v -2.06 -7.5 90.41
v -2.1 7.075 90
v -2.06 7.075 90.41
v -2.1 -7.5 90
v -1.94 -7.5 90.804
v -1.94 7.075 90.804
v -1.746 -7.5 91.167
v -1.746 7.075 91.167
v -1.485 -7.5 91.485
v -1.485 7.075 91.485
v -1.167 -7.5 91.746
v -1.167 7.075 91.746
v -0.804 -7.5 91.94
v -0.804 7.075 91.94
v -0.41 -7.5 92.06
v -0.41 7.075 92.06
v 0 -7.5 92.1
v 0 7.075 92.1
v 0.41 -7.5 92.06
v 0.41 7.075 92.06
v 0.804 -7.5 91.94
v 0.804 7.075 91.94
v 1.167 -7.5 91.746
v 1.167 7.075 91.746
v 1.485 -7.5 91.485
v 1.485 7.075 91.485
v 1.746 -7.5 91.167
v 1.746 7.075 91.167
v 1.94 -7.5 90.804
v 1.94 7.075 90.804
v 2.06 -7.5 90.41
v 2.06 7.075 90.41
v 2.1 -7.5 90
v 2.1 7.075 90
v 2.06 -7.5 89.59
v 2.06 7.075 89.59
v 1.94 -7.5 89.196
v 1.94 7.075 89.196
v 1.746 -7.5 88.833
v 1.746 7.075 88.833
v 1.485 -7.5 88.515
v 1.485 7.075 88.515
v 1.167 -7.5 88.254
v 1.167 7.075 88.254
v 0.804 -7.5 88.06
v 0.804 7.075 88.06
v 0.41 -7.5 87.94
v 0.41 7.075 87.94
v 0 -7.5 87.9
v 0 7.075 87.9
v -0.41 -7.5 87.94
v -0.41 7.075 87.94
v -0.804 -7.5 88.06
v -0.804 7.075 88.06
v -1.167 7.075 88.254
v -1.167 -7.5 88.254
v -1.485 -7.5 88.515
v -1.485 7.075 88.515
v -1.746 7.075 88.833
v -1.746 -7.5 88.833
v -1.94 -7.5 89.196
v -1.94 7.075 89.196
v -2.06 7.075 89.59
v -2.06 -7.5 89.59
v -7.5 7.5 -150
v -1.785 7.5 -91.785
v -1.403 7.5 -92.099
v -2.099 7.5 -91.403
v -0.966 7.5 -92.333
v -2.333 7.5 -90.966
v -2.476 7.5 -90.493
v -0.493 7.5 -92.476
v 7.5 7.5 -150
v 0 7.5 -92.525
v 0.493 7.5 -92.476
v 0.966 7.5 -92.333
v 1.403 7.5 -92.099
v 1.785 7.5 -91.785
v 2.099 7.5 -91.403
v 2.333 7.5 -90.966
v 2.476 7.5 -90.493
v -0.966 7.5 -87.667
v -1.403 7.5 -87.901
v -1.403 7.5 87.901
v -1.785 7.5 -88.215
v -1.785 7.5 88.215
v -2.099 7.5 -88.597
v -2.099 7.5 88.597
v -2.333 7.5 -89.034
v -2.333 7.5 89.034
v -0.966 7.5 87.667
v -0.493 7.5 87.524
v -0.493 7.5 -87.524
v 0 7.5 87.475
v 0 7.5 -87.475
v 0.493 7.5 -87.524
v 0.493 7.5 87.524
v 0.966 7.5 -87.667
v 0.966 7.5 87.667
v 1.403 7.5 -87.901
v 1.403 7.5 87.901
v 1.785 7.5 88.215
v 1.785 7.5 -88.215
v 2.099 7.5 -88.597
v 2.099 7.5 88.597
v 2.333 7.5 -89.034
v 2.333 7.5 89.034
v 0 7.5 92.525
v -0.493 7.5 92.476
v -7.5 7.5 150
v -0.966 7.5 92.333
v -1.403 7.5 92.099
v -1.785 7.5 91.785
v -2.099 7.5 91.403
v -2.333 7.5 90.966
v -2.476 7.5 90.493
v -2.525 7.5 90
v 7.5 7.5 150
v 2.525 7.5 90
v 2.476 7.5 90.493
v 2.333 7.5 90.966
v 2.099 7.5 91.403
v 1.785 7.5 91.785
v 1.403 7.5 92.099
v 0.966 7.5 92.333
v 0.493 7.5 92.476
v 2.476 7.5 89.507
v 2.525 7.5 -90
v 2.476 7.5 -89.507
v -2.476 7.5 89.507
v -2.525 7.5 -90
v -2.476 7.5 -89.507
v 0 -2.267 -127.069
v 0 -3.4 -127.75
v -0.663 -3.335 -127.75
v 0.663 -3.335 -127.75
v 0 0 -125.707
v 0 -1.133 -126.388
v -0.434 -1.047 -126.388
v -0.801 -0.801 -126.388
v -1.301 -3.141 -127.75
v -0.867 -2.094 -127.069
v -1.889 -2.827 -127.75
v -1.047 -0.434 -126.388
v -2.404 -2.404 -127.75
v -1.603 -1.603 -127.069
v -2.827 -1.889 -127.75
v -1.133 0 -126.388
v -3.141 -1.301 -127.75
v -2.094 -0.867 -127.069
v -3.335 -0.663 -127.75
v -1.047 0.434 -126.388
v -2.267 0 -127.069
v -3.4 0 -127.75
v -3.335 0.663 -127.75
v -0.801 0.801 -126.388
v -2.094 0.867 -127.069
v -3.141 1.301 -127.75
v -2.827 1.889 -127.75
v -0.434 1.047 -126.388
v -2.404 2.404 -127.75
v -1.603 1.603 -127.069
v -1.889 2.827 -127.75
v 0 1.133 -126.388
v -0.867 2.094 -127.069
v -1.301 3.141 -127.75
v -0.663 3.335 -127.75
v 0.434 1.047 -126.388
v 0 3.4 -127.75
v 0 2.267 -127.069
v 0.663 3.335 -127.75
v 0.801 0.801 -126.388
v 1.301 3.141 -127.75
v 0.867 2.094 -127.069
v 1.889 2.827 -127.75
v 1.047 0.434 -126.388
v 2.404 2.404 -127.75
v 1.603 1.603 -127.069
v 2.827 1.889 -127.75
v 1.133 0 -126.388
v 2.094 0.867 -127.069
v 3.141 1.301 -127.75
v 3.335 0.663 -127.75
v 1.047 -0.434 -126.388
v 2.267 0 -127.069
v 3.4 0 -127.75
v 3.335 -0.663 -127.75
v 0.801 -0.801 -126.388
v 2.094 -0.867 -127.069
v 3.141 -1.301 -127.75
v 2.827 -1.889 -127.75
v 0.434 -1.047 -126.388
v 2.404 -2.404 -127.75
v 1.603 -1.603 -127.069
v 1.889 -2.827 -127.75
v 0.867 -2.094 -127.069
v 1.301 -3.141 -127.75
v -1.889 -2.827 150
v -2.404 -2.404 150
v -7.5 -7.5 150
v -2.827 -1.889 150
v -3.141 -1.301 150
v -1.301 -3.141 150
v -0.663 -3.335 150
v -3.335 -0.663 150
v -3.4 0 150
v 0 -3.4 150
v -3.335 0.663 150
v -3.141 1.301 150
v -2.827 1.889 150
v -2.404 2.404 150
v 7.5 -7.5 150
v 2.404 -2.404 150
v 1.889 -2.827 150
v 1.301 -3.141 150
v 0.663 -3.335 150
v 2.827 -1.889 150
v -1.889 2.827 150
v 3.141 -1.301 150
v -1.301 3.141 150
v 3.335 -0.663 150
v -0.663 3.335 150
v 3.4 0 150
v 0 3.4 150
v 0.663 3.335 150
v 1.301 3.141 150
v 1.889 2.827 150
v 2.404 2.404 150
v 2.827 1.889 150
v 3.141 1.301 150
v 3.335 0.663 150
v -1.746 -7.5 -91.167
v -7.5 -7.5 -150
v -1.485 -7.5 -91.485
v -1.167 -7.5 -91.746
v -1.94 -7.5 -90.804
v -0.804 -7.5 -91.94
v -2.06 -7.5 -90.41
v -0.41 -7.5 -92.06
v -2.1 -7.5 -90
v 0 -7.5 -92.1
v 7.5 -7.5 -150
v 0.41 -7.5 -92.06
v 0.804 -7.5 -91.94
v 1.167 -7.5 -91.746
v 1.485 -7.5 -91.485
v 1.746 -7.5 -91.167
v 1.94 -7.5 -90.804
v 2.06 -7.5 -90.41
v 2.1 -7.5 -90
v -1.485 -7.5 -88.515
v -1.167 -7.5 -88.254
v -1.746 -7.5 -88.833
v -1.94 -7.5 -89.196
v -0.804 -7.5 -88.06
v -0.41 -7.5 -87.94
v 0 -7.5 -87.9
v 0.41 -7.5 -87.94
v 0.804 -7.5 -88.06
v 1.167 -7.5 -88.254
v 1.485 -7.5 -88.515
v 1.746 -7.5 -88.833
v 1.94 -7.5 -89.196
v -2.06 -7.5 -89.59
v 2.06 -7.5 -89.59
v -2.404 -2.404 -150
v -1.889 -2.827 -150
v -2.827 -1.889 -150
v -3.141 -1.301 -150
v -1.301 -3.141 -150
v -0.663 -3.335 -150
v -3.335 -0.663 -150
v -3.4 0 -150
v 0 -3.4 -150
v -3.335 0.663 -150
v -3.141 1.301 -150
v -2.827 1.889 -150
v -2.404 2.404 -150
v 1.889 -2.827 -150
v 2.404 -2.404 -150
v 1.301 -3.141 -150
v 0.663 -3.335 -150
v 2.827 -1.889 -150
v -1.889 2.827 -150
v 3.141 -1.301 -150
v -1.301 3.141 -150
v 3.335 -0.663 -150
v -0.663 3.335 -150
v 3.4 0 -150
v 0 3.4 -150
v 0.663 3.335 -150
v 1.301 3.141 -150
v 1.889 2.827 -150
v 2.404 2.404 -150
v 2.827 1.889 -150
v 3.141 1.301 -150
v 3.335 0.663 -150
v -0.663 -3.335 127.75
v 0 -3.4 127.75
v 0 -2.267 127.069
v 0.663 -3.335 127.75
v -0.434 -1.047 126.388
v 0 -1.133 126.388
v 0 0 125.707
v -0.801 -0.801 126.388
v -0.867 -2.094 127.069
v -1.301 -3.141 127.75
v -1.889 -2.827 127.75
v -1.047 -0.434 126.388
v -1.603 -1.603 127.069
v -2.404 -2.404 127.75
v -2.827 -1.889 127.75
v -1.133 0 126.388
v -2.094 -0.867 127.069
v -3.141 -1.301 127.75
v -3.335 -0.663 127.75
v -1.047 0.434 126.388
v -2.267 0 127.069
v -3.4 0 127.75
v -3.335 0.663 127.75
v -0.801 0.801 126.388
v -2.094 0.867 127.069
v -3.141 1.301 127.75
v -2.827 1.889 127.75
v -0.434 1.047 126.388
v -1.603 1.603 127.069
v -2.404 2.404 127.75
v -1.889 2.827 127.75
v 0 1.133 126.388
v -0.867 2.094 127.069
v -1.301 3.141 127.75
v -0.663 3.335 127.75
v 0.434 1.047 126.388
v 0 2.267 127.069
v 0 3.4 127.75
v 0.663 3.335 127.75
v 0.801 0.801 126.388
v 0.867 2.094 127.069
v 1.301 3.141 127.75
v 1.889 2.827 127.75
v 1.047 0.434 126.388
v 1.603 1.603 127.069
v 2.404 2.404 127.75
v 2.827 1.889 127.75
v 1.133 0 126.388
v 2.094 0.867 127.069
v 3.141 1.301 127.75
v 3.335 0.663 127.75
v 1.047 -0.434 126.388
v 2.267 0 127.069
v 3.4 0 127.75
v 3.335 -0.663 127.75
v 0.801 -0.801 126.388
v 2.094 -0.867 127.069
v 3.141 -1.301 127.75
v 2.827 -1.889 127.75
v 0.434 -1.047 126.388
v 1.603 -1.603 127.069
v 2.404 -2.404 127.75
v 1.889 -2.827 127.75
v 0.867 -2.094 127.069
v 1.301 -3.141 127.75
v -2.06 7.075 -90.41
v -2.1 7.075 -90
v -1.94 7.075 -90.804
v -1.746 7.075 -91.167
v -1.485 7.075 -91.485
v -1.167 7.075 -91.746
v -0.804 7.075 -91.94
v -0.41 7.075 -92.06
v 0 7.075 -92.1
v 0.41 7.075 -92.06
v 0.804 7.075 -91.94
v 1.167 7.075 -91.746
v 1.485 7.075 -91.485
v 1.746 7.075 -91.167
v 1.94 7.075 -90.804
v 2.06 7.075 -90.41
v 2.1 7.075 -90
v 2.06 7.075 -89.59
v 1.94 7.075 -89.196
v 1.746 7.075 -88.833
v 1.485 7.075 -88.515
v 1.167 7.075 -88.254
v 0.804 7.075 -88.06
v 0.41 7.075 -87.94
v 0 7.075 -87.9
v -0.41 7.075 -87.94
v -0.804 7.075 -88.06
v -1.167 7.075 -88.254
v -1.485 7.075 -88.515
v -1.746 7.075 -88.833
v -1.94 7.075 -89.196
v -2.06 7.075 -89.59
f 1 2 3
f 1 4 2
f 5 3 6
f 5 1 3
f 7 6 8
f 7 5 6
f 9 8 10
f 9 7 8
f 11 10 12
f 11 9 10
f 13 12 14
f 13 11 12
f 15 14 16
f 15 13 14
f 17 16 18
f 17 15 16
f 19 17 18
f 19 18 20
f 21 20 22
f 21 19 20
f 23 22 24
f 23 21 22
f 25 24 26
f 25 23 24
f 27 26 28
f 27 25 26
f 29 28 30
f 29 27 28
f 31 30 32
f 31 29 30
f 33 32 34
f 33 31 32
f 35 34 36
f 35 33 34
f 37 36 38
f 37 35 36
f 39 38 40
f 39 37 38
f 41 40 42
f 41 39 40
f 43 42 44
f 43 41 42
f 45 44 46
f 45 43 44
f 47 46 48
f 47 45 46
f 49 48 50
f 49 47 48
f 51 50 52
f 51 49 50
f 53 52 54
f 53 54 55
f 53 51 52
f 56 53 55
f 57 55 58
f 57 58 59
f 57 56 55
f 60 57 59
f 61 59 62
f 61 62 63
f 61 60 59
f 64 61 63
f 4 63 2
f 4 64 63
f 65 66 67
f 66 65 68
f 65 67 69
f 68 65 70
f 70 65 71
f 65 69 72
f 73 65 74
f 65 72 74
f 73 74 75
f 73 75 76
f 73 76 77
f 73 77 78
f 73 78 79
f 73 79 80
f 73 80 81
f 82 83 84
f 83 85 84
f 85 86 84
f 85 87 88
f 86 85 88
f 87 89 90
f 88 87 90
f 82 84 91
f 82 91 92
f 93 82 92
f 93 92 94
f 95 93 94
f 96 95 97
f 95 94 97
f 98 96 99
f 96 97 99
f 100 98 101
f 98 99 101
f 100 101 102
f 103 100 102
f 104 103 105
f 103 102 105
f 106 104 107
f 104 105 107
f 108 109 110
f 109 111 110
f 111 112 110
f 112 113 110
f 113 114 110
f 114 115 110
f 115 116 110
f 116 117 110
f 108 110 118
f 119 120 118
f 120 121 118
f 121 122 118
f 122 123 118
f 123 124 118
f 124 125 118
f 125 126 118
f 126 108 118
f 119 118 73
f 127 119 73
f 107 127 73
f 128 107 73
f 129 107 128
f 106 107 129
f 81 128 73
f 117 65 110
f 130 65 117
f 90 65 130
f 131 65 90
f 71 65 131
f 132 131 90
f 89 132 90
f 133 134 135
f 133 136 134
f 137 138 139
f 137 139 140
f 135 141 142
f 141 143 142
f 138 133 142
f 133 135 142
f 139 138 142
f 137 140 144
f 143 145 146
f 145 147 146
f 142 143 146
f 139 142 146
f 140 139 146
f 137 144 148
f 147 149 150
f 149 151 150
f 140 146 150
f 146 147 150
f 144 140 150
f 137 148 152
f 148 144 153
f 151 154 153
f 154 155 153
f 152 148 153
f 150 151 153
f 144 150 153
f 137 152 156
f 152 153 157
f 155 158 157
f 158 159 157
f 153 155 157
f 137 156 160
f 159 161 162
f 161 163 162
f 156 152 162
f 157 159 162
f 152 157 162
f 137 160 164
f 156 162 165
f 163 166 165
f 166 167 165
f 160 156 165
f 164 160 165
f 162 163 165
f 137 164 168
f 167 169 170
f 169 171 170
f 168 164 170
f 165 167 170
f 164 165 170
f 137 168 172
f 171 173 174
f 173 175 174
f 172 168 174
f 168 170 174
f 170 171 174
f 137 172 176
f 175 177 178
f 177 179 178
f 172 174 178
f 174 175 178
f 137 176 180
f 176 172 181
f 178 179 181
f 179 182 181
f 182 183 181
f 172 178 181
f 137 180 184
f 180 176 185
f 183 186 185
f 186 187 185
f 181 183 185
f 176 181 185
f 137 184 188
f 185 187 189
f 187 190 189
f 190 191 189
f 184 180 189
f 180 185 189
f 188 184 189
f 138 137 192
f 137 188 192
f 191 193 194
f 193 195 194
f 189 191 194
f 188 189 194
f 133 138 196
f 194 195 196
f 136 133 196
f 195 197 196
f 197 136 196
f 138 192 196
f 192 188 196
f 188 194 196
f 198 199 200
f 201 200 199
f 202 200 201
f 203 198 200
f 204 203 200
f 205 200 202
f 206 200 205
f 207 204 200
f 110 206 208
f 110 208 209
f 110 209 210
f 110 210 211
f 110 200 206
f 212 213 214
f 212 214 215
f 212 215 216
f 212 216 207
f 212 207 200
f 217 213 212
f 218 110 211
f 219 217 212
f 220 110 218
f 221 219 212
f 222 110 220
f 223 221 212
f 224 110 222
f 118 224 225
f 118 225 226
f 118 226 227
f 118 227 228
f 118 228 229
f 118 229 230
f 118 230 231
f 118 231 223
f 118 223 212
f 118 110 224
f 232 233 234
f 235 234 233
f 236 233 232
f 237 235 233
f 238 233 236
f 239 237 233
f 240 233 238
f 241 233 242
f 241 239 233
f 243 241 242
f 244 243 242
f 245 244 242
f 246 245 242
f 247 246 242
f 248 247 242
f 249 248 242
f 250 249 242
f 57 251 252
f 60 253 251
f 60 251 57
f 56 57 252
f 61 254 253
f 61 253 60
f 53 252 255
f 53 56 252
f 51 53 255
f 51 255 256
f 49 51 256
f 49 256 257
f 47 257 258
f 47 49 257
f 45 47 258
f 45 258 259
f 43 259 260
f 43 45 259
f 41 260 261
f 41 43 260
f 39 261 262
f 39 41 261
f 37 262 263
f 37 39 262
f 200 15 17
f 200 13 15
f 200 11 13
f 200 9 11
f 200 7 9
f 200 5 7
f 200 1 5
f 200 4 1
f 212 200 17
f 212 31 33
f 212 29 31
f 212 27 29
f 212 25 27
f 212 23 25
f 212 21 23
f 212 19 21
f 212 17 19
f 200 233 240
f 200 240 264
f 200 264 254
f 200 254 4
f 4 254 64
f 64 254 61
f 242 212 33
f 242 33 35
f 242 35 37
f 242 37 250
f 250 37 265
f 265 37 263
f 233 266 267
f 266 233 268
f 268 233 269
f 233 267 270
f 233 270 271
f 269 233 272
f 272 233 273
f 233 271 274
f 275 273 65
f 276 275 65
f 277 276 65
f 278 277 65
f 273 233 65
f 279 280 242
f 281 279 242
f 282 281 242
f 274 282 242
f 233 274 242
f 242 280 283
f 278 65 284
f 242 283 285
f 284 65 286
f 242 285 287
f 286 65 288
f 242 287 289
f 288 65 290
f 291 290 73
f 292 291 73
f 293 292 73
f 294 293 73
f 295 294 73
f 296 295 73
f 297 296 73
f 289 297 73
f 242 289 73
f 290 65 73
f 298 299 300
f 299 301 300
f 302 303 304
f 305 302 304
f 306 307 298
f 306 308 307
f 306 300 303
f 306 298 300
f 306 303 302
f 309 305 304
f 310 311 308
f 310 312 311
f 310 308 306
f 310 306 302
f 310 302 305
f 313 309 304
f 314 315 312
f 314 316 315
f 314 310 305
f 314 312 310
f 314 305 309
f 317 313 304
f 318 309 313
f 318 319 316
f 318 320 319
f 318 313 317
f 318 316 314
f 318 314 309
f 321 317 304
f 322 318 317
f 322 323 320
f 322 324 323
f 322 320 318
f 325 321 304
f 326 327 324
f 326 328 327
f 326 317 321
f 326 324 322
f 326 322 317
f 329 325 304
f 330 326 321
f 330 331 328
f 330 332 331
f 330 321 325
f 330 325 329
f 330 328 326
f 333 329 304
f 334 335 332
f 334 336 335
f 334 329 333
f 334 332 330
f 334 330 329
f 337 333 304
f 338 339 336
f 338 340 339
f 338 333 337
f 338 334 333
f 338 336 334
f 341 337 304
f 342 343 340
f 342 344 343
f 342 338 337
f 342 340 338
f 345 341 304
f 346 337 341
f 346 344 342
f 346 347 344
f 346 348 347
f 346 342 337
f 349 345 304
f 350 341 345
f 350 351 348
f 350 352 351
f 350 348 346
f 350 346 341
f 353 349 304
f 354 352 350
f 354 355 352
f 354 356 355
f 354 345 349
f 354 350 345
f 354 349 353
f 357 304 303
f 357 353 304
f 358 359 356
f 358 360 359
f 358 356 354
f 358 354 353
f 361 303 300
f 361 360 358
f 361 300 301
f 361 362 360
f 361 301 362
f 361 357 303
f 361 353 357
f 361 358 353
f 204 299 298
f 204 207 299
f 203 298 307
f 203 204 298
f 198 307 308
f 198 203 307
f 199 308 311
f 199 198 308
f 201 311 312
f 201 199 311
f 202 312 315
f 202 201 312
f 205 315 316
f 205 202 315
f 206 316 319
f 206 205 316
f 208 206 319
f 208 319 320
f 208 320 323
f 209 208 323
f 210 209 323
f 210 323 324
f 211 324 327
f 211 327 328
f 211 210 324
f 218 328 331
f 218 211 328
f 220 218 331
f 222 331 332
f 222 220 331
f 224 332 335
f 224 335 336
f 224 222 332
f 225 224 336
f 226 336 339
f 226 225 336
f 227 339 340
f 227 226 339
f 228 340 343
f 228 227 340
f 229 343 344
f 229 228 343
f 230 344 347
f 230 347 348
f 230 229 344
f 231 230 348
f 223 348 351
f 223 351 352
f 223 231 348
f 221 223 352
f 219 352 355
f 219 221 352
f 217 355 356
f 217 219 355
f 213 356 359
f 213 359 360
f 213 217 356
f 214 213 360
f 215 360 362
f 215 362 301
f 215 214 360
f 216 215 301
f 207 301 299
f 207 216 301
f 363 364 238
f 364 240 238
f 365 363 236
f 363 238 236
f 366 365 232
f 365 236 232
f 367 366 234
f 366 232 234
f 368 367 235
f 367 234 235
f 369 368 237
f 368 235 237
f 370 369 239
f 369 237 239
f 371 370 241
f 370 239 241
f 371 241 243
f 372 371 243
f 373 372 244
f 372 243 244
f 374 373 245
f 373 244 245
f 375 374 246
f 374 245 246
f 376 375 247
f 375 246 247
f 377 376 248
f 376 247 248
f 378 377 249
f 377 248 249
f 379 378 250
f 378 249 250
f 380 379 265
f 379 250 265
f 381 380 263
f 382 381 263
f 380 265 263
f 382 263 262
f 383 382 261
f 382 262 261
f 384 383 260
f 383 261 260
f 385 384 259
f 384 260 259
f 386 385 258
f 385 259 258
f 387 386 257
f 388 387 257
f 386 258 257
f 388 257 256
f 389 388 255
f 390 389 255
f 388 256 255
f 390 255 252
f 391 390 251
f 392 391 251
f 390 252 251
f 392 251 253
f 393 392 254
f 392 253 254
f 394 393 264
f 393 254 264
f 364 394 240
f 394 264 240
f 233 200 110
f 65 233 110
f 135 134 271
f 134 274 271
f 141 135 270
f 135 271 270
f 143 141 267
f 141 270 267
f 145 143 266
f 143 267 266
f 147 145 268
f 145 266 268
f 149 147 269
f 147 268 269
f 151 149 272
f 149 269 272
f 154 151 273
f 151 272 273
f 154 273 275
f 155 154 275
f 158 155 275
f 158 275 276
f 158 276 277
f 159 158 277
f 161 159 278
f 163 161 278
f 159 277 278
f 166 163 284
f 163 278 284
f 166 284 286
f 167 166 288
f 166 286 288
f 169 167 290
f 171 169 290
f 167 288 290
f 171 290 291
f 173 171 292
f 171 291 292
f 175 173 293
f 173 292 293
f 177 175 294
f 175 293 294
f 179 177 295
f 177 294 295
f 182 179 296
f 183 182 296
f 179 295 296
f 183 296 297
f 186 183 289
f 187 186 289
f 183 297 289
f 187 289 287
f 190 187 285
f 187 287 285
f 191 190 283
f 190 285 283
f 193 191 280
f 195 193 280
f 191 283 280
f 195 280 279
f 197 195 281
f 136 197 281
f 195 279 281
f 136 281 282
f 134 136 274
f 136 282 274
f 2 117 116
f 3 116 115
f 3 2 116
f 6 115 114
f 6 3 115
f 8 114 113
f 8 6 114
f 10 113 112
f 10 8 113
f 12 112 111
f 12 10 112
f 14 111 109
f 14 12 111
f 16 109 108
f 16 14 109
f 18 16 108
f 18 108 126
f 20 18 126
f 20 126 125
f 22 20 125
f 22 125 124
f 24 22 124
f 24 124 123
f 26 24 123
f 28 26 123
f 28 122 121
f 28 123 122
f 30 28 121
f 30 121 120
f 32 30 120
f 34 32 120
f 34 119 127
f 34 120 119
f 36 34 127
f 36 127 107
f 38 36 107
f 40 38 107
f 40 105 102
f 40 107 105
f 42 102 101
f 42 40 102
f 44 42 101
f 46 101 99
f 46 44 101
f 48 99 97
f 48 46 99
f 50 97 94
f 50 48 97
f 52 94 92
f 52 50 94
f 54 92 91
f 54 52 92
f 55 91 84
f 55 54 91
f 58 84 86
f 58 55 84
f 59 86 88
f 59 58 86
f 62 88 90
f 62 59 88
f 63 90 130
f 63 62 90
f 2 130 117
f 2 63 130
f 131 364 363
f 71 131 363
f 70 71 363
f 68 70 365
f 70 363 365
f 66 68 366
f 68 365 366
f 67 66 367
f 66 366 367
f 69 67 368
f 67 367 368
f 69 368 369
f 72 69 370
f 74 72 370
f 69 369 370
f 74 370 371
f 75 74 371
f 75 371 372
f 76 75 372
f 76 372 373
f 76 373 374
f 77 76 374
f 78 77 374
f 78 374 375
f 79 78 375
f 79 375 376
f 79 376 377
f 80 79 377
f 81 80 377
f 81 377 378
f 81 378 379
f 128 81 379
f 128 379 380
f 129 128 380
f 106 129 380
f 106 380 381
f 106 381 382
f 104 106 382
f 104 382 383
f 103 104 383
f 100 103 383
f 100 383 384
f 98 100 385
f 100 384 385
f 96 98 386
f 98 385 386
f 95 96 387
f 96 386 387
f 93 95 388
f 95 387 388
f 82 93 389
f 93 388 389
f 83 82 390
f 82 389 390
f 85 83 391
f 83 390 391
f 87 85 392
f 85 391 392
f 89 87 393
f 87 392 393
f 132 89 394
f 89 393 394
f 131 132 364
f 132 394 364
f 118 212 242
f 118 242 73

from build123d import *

# Parameters (mm, degrees)
IZIM1_W                     = 15
IZIM1_H                     = 15
Y_KSEKLIK_EKSTR_ZYON1_DEPTH = 150
M5_DI_LI_DELIK1_D           = 4.2
M5_DI_LI_DELIK1_CSINK_D     = 5.05
M5_DI_LI_DELIK1_CSINK_ANGLE = 90


with BuildPart() as part:
    # Çizim1 → Yükseklik-Ekstrüzyon1 (new, symmetric)
    with BuildSketch(Plane.XY):
        Rectangle(IZIM1_W, IZIM1_H)
    extrude(amount=Y_KSEKLIK_EKSTR_ZYON1_DEPTH, both=True)

    # Çizim3 → M8 Dişli Delik1 (revolve, cut)
    with BuildSketch(Plane(origin=(0, 0, 150), x_dir=(0, -1, 0), z_dir=(1, 0, 0))):
        Polygon((0, 0), (0, 24.292926105), (3.4, 22.25), (3.4, 0), align=None)
    m8_di_li_delik1 = revolve(axis=Axis((0, 0, 156.35), (0, 0, -1)), mode=Mode.SUBTRACT)

    # Aynalama1: M8 Dişli Delik1 across plane
    add(m8_di_li_delik1.mirror(Plane.XY), mode=Mode.SUBTRACT)

    # M5 Dişli Delik1 (through all)
    with Locations(Plane(origin=(0, 7.5, 0), x_dir=(1, 0, 0), z_dir=(0, 1, 0))):
        with Locations((0, 90)):
            m5_di_li_delik1 = CounterSinkHole(M5_DI_LI_DELIK1_D / 2, M5_DI_LI_DELIK1_CSINK_D / 2, counter_sink_angle=M5_DI_LI_DELIK1_CSINK_ANGLE)

    # Aynalama2: M5 Dişli Delik1 across plane
    add(m5_di_li_delik1.mirror(Plane.XY), mode=Mode.SUBTRACT)


solid = part.part
